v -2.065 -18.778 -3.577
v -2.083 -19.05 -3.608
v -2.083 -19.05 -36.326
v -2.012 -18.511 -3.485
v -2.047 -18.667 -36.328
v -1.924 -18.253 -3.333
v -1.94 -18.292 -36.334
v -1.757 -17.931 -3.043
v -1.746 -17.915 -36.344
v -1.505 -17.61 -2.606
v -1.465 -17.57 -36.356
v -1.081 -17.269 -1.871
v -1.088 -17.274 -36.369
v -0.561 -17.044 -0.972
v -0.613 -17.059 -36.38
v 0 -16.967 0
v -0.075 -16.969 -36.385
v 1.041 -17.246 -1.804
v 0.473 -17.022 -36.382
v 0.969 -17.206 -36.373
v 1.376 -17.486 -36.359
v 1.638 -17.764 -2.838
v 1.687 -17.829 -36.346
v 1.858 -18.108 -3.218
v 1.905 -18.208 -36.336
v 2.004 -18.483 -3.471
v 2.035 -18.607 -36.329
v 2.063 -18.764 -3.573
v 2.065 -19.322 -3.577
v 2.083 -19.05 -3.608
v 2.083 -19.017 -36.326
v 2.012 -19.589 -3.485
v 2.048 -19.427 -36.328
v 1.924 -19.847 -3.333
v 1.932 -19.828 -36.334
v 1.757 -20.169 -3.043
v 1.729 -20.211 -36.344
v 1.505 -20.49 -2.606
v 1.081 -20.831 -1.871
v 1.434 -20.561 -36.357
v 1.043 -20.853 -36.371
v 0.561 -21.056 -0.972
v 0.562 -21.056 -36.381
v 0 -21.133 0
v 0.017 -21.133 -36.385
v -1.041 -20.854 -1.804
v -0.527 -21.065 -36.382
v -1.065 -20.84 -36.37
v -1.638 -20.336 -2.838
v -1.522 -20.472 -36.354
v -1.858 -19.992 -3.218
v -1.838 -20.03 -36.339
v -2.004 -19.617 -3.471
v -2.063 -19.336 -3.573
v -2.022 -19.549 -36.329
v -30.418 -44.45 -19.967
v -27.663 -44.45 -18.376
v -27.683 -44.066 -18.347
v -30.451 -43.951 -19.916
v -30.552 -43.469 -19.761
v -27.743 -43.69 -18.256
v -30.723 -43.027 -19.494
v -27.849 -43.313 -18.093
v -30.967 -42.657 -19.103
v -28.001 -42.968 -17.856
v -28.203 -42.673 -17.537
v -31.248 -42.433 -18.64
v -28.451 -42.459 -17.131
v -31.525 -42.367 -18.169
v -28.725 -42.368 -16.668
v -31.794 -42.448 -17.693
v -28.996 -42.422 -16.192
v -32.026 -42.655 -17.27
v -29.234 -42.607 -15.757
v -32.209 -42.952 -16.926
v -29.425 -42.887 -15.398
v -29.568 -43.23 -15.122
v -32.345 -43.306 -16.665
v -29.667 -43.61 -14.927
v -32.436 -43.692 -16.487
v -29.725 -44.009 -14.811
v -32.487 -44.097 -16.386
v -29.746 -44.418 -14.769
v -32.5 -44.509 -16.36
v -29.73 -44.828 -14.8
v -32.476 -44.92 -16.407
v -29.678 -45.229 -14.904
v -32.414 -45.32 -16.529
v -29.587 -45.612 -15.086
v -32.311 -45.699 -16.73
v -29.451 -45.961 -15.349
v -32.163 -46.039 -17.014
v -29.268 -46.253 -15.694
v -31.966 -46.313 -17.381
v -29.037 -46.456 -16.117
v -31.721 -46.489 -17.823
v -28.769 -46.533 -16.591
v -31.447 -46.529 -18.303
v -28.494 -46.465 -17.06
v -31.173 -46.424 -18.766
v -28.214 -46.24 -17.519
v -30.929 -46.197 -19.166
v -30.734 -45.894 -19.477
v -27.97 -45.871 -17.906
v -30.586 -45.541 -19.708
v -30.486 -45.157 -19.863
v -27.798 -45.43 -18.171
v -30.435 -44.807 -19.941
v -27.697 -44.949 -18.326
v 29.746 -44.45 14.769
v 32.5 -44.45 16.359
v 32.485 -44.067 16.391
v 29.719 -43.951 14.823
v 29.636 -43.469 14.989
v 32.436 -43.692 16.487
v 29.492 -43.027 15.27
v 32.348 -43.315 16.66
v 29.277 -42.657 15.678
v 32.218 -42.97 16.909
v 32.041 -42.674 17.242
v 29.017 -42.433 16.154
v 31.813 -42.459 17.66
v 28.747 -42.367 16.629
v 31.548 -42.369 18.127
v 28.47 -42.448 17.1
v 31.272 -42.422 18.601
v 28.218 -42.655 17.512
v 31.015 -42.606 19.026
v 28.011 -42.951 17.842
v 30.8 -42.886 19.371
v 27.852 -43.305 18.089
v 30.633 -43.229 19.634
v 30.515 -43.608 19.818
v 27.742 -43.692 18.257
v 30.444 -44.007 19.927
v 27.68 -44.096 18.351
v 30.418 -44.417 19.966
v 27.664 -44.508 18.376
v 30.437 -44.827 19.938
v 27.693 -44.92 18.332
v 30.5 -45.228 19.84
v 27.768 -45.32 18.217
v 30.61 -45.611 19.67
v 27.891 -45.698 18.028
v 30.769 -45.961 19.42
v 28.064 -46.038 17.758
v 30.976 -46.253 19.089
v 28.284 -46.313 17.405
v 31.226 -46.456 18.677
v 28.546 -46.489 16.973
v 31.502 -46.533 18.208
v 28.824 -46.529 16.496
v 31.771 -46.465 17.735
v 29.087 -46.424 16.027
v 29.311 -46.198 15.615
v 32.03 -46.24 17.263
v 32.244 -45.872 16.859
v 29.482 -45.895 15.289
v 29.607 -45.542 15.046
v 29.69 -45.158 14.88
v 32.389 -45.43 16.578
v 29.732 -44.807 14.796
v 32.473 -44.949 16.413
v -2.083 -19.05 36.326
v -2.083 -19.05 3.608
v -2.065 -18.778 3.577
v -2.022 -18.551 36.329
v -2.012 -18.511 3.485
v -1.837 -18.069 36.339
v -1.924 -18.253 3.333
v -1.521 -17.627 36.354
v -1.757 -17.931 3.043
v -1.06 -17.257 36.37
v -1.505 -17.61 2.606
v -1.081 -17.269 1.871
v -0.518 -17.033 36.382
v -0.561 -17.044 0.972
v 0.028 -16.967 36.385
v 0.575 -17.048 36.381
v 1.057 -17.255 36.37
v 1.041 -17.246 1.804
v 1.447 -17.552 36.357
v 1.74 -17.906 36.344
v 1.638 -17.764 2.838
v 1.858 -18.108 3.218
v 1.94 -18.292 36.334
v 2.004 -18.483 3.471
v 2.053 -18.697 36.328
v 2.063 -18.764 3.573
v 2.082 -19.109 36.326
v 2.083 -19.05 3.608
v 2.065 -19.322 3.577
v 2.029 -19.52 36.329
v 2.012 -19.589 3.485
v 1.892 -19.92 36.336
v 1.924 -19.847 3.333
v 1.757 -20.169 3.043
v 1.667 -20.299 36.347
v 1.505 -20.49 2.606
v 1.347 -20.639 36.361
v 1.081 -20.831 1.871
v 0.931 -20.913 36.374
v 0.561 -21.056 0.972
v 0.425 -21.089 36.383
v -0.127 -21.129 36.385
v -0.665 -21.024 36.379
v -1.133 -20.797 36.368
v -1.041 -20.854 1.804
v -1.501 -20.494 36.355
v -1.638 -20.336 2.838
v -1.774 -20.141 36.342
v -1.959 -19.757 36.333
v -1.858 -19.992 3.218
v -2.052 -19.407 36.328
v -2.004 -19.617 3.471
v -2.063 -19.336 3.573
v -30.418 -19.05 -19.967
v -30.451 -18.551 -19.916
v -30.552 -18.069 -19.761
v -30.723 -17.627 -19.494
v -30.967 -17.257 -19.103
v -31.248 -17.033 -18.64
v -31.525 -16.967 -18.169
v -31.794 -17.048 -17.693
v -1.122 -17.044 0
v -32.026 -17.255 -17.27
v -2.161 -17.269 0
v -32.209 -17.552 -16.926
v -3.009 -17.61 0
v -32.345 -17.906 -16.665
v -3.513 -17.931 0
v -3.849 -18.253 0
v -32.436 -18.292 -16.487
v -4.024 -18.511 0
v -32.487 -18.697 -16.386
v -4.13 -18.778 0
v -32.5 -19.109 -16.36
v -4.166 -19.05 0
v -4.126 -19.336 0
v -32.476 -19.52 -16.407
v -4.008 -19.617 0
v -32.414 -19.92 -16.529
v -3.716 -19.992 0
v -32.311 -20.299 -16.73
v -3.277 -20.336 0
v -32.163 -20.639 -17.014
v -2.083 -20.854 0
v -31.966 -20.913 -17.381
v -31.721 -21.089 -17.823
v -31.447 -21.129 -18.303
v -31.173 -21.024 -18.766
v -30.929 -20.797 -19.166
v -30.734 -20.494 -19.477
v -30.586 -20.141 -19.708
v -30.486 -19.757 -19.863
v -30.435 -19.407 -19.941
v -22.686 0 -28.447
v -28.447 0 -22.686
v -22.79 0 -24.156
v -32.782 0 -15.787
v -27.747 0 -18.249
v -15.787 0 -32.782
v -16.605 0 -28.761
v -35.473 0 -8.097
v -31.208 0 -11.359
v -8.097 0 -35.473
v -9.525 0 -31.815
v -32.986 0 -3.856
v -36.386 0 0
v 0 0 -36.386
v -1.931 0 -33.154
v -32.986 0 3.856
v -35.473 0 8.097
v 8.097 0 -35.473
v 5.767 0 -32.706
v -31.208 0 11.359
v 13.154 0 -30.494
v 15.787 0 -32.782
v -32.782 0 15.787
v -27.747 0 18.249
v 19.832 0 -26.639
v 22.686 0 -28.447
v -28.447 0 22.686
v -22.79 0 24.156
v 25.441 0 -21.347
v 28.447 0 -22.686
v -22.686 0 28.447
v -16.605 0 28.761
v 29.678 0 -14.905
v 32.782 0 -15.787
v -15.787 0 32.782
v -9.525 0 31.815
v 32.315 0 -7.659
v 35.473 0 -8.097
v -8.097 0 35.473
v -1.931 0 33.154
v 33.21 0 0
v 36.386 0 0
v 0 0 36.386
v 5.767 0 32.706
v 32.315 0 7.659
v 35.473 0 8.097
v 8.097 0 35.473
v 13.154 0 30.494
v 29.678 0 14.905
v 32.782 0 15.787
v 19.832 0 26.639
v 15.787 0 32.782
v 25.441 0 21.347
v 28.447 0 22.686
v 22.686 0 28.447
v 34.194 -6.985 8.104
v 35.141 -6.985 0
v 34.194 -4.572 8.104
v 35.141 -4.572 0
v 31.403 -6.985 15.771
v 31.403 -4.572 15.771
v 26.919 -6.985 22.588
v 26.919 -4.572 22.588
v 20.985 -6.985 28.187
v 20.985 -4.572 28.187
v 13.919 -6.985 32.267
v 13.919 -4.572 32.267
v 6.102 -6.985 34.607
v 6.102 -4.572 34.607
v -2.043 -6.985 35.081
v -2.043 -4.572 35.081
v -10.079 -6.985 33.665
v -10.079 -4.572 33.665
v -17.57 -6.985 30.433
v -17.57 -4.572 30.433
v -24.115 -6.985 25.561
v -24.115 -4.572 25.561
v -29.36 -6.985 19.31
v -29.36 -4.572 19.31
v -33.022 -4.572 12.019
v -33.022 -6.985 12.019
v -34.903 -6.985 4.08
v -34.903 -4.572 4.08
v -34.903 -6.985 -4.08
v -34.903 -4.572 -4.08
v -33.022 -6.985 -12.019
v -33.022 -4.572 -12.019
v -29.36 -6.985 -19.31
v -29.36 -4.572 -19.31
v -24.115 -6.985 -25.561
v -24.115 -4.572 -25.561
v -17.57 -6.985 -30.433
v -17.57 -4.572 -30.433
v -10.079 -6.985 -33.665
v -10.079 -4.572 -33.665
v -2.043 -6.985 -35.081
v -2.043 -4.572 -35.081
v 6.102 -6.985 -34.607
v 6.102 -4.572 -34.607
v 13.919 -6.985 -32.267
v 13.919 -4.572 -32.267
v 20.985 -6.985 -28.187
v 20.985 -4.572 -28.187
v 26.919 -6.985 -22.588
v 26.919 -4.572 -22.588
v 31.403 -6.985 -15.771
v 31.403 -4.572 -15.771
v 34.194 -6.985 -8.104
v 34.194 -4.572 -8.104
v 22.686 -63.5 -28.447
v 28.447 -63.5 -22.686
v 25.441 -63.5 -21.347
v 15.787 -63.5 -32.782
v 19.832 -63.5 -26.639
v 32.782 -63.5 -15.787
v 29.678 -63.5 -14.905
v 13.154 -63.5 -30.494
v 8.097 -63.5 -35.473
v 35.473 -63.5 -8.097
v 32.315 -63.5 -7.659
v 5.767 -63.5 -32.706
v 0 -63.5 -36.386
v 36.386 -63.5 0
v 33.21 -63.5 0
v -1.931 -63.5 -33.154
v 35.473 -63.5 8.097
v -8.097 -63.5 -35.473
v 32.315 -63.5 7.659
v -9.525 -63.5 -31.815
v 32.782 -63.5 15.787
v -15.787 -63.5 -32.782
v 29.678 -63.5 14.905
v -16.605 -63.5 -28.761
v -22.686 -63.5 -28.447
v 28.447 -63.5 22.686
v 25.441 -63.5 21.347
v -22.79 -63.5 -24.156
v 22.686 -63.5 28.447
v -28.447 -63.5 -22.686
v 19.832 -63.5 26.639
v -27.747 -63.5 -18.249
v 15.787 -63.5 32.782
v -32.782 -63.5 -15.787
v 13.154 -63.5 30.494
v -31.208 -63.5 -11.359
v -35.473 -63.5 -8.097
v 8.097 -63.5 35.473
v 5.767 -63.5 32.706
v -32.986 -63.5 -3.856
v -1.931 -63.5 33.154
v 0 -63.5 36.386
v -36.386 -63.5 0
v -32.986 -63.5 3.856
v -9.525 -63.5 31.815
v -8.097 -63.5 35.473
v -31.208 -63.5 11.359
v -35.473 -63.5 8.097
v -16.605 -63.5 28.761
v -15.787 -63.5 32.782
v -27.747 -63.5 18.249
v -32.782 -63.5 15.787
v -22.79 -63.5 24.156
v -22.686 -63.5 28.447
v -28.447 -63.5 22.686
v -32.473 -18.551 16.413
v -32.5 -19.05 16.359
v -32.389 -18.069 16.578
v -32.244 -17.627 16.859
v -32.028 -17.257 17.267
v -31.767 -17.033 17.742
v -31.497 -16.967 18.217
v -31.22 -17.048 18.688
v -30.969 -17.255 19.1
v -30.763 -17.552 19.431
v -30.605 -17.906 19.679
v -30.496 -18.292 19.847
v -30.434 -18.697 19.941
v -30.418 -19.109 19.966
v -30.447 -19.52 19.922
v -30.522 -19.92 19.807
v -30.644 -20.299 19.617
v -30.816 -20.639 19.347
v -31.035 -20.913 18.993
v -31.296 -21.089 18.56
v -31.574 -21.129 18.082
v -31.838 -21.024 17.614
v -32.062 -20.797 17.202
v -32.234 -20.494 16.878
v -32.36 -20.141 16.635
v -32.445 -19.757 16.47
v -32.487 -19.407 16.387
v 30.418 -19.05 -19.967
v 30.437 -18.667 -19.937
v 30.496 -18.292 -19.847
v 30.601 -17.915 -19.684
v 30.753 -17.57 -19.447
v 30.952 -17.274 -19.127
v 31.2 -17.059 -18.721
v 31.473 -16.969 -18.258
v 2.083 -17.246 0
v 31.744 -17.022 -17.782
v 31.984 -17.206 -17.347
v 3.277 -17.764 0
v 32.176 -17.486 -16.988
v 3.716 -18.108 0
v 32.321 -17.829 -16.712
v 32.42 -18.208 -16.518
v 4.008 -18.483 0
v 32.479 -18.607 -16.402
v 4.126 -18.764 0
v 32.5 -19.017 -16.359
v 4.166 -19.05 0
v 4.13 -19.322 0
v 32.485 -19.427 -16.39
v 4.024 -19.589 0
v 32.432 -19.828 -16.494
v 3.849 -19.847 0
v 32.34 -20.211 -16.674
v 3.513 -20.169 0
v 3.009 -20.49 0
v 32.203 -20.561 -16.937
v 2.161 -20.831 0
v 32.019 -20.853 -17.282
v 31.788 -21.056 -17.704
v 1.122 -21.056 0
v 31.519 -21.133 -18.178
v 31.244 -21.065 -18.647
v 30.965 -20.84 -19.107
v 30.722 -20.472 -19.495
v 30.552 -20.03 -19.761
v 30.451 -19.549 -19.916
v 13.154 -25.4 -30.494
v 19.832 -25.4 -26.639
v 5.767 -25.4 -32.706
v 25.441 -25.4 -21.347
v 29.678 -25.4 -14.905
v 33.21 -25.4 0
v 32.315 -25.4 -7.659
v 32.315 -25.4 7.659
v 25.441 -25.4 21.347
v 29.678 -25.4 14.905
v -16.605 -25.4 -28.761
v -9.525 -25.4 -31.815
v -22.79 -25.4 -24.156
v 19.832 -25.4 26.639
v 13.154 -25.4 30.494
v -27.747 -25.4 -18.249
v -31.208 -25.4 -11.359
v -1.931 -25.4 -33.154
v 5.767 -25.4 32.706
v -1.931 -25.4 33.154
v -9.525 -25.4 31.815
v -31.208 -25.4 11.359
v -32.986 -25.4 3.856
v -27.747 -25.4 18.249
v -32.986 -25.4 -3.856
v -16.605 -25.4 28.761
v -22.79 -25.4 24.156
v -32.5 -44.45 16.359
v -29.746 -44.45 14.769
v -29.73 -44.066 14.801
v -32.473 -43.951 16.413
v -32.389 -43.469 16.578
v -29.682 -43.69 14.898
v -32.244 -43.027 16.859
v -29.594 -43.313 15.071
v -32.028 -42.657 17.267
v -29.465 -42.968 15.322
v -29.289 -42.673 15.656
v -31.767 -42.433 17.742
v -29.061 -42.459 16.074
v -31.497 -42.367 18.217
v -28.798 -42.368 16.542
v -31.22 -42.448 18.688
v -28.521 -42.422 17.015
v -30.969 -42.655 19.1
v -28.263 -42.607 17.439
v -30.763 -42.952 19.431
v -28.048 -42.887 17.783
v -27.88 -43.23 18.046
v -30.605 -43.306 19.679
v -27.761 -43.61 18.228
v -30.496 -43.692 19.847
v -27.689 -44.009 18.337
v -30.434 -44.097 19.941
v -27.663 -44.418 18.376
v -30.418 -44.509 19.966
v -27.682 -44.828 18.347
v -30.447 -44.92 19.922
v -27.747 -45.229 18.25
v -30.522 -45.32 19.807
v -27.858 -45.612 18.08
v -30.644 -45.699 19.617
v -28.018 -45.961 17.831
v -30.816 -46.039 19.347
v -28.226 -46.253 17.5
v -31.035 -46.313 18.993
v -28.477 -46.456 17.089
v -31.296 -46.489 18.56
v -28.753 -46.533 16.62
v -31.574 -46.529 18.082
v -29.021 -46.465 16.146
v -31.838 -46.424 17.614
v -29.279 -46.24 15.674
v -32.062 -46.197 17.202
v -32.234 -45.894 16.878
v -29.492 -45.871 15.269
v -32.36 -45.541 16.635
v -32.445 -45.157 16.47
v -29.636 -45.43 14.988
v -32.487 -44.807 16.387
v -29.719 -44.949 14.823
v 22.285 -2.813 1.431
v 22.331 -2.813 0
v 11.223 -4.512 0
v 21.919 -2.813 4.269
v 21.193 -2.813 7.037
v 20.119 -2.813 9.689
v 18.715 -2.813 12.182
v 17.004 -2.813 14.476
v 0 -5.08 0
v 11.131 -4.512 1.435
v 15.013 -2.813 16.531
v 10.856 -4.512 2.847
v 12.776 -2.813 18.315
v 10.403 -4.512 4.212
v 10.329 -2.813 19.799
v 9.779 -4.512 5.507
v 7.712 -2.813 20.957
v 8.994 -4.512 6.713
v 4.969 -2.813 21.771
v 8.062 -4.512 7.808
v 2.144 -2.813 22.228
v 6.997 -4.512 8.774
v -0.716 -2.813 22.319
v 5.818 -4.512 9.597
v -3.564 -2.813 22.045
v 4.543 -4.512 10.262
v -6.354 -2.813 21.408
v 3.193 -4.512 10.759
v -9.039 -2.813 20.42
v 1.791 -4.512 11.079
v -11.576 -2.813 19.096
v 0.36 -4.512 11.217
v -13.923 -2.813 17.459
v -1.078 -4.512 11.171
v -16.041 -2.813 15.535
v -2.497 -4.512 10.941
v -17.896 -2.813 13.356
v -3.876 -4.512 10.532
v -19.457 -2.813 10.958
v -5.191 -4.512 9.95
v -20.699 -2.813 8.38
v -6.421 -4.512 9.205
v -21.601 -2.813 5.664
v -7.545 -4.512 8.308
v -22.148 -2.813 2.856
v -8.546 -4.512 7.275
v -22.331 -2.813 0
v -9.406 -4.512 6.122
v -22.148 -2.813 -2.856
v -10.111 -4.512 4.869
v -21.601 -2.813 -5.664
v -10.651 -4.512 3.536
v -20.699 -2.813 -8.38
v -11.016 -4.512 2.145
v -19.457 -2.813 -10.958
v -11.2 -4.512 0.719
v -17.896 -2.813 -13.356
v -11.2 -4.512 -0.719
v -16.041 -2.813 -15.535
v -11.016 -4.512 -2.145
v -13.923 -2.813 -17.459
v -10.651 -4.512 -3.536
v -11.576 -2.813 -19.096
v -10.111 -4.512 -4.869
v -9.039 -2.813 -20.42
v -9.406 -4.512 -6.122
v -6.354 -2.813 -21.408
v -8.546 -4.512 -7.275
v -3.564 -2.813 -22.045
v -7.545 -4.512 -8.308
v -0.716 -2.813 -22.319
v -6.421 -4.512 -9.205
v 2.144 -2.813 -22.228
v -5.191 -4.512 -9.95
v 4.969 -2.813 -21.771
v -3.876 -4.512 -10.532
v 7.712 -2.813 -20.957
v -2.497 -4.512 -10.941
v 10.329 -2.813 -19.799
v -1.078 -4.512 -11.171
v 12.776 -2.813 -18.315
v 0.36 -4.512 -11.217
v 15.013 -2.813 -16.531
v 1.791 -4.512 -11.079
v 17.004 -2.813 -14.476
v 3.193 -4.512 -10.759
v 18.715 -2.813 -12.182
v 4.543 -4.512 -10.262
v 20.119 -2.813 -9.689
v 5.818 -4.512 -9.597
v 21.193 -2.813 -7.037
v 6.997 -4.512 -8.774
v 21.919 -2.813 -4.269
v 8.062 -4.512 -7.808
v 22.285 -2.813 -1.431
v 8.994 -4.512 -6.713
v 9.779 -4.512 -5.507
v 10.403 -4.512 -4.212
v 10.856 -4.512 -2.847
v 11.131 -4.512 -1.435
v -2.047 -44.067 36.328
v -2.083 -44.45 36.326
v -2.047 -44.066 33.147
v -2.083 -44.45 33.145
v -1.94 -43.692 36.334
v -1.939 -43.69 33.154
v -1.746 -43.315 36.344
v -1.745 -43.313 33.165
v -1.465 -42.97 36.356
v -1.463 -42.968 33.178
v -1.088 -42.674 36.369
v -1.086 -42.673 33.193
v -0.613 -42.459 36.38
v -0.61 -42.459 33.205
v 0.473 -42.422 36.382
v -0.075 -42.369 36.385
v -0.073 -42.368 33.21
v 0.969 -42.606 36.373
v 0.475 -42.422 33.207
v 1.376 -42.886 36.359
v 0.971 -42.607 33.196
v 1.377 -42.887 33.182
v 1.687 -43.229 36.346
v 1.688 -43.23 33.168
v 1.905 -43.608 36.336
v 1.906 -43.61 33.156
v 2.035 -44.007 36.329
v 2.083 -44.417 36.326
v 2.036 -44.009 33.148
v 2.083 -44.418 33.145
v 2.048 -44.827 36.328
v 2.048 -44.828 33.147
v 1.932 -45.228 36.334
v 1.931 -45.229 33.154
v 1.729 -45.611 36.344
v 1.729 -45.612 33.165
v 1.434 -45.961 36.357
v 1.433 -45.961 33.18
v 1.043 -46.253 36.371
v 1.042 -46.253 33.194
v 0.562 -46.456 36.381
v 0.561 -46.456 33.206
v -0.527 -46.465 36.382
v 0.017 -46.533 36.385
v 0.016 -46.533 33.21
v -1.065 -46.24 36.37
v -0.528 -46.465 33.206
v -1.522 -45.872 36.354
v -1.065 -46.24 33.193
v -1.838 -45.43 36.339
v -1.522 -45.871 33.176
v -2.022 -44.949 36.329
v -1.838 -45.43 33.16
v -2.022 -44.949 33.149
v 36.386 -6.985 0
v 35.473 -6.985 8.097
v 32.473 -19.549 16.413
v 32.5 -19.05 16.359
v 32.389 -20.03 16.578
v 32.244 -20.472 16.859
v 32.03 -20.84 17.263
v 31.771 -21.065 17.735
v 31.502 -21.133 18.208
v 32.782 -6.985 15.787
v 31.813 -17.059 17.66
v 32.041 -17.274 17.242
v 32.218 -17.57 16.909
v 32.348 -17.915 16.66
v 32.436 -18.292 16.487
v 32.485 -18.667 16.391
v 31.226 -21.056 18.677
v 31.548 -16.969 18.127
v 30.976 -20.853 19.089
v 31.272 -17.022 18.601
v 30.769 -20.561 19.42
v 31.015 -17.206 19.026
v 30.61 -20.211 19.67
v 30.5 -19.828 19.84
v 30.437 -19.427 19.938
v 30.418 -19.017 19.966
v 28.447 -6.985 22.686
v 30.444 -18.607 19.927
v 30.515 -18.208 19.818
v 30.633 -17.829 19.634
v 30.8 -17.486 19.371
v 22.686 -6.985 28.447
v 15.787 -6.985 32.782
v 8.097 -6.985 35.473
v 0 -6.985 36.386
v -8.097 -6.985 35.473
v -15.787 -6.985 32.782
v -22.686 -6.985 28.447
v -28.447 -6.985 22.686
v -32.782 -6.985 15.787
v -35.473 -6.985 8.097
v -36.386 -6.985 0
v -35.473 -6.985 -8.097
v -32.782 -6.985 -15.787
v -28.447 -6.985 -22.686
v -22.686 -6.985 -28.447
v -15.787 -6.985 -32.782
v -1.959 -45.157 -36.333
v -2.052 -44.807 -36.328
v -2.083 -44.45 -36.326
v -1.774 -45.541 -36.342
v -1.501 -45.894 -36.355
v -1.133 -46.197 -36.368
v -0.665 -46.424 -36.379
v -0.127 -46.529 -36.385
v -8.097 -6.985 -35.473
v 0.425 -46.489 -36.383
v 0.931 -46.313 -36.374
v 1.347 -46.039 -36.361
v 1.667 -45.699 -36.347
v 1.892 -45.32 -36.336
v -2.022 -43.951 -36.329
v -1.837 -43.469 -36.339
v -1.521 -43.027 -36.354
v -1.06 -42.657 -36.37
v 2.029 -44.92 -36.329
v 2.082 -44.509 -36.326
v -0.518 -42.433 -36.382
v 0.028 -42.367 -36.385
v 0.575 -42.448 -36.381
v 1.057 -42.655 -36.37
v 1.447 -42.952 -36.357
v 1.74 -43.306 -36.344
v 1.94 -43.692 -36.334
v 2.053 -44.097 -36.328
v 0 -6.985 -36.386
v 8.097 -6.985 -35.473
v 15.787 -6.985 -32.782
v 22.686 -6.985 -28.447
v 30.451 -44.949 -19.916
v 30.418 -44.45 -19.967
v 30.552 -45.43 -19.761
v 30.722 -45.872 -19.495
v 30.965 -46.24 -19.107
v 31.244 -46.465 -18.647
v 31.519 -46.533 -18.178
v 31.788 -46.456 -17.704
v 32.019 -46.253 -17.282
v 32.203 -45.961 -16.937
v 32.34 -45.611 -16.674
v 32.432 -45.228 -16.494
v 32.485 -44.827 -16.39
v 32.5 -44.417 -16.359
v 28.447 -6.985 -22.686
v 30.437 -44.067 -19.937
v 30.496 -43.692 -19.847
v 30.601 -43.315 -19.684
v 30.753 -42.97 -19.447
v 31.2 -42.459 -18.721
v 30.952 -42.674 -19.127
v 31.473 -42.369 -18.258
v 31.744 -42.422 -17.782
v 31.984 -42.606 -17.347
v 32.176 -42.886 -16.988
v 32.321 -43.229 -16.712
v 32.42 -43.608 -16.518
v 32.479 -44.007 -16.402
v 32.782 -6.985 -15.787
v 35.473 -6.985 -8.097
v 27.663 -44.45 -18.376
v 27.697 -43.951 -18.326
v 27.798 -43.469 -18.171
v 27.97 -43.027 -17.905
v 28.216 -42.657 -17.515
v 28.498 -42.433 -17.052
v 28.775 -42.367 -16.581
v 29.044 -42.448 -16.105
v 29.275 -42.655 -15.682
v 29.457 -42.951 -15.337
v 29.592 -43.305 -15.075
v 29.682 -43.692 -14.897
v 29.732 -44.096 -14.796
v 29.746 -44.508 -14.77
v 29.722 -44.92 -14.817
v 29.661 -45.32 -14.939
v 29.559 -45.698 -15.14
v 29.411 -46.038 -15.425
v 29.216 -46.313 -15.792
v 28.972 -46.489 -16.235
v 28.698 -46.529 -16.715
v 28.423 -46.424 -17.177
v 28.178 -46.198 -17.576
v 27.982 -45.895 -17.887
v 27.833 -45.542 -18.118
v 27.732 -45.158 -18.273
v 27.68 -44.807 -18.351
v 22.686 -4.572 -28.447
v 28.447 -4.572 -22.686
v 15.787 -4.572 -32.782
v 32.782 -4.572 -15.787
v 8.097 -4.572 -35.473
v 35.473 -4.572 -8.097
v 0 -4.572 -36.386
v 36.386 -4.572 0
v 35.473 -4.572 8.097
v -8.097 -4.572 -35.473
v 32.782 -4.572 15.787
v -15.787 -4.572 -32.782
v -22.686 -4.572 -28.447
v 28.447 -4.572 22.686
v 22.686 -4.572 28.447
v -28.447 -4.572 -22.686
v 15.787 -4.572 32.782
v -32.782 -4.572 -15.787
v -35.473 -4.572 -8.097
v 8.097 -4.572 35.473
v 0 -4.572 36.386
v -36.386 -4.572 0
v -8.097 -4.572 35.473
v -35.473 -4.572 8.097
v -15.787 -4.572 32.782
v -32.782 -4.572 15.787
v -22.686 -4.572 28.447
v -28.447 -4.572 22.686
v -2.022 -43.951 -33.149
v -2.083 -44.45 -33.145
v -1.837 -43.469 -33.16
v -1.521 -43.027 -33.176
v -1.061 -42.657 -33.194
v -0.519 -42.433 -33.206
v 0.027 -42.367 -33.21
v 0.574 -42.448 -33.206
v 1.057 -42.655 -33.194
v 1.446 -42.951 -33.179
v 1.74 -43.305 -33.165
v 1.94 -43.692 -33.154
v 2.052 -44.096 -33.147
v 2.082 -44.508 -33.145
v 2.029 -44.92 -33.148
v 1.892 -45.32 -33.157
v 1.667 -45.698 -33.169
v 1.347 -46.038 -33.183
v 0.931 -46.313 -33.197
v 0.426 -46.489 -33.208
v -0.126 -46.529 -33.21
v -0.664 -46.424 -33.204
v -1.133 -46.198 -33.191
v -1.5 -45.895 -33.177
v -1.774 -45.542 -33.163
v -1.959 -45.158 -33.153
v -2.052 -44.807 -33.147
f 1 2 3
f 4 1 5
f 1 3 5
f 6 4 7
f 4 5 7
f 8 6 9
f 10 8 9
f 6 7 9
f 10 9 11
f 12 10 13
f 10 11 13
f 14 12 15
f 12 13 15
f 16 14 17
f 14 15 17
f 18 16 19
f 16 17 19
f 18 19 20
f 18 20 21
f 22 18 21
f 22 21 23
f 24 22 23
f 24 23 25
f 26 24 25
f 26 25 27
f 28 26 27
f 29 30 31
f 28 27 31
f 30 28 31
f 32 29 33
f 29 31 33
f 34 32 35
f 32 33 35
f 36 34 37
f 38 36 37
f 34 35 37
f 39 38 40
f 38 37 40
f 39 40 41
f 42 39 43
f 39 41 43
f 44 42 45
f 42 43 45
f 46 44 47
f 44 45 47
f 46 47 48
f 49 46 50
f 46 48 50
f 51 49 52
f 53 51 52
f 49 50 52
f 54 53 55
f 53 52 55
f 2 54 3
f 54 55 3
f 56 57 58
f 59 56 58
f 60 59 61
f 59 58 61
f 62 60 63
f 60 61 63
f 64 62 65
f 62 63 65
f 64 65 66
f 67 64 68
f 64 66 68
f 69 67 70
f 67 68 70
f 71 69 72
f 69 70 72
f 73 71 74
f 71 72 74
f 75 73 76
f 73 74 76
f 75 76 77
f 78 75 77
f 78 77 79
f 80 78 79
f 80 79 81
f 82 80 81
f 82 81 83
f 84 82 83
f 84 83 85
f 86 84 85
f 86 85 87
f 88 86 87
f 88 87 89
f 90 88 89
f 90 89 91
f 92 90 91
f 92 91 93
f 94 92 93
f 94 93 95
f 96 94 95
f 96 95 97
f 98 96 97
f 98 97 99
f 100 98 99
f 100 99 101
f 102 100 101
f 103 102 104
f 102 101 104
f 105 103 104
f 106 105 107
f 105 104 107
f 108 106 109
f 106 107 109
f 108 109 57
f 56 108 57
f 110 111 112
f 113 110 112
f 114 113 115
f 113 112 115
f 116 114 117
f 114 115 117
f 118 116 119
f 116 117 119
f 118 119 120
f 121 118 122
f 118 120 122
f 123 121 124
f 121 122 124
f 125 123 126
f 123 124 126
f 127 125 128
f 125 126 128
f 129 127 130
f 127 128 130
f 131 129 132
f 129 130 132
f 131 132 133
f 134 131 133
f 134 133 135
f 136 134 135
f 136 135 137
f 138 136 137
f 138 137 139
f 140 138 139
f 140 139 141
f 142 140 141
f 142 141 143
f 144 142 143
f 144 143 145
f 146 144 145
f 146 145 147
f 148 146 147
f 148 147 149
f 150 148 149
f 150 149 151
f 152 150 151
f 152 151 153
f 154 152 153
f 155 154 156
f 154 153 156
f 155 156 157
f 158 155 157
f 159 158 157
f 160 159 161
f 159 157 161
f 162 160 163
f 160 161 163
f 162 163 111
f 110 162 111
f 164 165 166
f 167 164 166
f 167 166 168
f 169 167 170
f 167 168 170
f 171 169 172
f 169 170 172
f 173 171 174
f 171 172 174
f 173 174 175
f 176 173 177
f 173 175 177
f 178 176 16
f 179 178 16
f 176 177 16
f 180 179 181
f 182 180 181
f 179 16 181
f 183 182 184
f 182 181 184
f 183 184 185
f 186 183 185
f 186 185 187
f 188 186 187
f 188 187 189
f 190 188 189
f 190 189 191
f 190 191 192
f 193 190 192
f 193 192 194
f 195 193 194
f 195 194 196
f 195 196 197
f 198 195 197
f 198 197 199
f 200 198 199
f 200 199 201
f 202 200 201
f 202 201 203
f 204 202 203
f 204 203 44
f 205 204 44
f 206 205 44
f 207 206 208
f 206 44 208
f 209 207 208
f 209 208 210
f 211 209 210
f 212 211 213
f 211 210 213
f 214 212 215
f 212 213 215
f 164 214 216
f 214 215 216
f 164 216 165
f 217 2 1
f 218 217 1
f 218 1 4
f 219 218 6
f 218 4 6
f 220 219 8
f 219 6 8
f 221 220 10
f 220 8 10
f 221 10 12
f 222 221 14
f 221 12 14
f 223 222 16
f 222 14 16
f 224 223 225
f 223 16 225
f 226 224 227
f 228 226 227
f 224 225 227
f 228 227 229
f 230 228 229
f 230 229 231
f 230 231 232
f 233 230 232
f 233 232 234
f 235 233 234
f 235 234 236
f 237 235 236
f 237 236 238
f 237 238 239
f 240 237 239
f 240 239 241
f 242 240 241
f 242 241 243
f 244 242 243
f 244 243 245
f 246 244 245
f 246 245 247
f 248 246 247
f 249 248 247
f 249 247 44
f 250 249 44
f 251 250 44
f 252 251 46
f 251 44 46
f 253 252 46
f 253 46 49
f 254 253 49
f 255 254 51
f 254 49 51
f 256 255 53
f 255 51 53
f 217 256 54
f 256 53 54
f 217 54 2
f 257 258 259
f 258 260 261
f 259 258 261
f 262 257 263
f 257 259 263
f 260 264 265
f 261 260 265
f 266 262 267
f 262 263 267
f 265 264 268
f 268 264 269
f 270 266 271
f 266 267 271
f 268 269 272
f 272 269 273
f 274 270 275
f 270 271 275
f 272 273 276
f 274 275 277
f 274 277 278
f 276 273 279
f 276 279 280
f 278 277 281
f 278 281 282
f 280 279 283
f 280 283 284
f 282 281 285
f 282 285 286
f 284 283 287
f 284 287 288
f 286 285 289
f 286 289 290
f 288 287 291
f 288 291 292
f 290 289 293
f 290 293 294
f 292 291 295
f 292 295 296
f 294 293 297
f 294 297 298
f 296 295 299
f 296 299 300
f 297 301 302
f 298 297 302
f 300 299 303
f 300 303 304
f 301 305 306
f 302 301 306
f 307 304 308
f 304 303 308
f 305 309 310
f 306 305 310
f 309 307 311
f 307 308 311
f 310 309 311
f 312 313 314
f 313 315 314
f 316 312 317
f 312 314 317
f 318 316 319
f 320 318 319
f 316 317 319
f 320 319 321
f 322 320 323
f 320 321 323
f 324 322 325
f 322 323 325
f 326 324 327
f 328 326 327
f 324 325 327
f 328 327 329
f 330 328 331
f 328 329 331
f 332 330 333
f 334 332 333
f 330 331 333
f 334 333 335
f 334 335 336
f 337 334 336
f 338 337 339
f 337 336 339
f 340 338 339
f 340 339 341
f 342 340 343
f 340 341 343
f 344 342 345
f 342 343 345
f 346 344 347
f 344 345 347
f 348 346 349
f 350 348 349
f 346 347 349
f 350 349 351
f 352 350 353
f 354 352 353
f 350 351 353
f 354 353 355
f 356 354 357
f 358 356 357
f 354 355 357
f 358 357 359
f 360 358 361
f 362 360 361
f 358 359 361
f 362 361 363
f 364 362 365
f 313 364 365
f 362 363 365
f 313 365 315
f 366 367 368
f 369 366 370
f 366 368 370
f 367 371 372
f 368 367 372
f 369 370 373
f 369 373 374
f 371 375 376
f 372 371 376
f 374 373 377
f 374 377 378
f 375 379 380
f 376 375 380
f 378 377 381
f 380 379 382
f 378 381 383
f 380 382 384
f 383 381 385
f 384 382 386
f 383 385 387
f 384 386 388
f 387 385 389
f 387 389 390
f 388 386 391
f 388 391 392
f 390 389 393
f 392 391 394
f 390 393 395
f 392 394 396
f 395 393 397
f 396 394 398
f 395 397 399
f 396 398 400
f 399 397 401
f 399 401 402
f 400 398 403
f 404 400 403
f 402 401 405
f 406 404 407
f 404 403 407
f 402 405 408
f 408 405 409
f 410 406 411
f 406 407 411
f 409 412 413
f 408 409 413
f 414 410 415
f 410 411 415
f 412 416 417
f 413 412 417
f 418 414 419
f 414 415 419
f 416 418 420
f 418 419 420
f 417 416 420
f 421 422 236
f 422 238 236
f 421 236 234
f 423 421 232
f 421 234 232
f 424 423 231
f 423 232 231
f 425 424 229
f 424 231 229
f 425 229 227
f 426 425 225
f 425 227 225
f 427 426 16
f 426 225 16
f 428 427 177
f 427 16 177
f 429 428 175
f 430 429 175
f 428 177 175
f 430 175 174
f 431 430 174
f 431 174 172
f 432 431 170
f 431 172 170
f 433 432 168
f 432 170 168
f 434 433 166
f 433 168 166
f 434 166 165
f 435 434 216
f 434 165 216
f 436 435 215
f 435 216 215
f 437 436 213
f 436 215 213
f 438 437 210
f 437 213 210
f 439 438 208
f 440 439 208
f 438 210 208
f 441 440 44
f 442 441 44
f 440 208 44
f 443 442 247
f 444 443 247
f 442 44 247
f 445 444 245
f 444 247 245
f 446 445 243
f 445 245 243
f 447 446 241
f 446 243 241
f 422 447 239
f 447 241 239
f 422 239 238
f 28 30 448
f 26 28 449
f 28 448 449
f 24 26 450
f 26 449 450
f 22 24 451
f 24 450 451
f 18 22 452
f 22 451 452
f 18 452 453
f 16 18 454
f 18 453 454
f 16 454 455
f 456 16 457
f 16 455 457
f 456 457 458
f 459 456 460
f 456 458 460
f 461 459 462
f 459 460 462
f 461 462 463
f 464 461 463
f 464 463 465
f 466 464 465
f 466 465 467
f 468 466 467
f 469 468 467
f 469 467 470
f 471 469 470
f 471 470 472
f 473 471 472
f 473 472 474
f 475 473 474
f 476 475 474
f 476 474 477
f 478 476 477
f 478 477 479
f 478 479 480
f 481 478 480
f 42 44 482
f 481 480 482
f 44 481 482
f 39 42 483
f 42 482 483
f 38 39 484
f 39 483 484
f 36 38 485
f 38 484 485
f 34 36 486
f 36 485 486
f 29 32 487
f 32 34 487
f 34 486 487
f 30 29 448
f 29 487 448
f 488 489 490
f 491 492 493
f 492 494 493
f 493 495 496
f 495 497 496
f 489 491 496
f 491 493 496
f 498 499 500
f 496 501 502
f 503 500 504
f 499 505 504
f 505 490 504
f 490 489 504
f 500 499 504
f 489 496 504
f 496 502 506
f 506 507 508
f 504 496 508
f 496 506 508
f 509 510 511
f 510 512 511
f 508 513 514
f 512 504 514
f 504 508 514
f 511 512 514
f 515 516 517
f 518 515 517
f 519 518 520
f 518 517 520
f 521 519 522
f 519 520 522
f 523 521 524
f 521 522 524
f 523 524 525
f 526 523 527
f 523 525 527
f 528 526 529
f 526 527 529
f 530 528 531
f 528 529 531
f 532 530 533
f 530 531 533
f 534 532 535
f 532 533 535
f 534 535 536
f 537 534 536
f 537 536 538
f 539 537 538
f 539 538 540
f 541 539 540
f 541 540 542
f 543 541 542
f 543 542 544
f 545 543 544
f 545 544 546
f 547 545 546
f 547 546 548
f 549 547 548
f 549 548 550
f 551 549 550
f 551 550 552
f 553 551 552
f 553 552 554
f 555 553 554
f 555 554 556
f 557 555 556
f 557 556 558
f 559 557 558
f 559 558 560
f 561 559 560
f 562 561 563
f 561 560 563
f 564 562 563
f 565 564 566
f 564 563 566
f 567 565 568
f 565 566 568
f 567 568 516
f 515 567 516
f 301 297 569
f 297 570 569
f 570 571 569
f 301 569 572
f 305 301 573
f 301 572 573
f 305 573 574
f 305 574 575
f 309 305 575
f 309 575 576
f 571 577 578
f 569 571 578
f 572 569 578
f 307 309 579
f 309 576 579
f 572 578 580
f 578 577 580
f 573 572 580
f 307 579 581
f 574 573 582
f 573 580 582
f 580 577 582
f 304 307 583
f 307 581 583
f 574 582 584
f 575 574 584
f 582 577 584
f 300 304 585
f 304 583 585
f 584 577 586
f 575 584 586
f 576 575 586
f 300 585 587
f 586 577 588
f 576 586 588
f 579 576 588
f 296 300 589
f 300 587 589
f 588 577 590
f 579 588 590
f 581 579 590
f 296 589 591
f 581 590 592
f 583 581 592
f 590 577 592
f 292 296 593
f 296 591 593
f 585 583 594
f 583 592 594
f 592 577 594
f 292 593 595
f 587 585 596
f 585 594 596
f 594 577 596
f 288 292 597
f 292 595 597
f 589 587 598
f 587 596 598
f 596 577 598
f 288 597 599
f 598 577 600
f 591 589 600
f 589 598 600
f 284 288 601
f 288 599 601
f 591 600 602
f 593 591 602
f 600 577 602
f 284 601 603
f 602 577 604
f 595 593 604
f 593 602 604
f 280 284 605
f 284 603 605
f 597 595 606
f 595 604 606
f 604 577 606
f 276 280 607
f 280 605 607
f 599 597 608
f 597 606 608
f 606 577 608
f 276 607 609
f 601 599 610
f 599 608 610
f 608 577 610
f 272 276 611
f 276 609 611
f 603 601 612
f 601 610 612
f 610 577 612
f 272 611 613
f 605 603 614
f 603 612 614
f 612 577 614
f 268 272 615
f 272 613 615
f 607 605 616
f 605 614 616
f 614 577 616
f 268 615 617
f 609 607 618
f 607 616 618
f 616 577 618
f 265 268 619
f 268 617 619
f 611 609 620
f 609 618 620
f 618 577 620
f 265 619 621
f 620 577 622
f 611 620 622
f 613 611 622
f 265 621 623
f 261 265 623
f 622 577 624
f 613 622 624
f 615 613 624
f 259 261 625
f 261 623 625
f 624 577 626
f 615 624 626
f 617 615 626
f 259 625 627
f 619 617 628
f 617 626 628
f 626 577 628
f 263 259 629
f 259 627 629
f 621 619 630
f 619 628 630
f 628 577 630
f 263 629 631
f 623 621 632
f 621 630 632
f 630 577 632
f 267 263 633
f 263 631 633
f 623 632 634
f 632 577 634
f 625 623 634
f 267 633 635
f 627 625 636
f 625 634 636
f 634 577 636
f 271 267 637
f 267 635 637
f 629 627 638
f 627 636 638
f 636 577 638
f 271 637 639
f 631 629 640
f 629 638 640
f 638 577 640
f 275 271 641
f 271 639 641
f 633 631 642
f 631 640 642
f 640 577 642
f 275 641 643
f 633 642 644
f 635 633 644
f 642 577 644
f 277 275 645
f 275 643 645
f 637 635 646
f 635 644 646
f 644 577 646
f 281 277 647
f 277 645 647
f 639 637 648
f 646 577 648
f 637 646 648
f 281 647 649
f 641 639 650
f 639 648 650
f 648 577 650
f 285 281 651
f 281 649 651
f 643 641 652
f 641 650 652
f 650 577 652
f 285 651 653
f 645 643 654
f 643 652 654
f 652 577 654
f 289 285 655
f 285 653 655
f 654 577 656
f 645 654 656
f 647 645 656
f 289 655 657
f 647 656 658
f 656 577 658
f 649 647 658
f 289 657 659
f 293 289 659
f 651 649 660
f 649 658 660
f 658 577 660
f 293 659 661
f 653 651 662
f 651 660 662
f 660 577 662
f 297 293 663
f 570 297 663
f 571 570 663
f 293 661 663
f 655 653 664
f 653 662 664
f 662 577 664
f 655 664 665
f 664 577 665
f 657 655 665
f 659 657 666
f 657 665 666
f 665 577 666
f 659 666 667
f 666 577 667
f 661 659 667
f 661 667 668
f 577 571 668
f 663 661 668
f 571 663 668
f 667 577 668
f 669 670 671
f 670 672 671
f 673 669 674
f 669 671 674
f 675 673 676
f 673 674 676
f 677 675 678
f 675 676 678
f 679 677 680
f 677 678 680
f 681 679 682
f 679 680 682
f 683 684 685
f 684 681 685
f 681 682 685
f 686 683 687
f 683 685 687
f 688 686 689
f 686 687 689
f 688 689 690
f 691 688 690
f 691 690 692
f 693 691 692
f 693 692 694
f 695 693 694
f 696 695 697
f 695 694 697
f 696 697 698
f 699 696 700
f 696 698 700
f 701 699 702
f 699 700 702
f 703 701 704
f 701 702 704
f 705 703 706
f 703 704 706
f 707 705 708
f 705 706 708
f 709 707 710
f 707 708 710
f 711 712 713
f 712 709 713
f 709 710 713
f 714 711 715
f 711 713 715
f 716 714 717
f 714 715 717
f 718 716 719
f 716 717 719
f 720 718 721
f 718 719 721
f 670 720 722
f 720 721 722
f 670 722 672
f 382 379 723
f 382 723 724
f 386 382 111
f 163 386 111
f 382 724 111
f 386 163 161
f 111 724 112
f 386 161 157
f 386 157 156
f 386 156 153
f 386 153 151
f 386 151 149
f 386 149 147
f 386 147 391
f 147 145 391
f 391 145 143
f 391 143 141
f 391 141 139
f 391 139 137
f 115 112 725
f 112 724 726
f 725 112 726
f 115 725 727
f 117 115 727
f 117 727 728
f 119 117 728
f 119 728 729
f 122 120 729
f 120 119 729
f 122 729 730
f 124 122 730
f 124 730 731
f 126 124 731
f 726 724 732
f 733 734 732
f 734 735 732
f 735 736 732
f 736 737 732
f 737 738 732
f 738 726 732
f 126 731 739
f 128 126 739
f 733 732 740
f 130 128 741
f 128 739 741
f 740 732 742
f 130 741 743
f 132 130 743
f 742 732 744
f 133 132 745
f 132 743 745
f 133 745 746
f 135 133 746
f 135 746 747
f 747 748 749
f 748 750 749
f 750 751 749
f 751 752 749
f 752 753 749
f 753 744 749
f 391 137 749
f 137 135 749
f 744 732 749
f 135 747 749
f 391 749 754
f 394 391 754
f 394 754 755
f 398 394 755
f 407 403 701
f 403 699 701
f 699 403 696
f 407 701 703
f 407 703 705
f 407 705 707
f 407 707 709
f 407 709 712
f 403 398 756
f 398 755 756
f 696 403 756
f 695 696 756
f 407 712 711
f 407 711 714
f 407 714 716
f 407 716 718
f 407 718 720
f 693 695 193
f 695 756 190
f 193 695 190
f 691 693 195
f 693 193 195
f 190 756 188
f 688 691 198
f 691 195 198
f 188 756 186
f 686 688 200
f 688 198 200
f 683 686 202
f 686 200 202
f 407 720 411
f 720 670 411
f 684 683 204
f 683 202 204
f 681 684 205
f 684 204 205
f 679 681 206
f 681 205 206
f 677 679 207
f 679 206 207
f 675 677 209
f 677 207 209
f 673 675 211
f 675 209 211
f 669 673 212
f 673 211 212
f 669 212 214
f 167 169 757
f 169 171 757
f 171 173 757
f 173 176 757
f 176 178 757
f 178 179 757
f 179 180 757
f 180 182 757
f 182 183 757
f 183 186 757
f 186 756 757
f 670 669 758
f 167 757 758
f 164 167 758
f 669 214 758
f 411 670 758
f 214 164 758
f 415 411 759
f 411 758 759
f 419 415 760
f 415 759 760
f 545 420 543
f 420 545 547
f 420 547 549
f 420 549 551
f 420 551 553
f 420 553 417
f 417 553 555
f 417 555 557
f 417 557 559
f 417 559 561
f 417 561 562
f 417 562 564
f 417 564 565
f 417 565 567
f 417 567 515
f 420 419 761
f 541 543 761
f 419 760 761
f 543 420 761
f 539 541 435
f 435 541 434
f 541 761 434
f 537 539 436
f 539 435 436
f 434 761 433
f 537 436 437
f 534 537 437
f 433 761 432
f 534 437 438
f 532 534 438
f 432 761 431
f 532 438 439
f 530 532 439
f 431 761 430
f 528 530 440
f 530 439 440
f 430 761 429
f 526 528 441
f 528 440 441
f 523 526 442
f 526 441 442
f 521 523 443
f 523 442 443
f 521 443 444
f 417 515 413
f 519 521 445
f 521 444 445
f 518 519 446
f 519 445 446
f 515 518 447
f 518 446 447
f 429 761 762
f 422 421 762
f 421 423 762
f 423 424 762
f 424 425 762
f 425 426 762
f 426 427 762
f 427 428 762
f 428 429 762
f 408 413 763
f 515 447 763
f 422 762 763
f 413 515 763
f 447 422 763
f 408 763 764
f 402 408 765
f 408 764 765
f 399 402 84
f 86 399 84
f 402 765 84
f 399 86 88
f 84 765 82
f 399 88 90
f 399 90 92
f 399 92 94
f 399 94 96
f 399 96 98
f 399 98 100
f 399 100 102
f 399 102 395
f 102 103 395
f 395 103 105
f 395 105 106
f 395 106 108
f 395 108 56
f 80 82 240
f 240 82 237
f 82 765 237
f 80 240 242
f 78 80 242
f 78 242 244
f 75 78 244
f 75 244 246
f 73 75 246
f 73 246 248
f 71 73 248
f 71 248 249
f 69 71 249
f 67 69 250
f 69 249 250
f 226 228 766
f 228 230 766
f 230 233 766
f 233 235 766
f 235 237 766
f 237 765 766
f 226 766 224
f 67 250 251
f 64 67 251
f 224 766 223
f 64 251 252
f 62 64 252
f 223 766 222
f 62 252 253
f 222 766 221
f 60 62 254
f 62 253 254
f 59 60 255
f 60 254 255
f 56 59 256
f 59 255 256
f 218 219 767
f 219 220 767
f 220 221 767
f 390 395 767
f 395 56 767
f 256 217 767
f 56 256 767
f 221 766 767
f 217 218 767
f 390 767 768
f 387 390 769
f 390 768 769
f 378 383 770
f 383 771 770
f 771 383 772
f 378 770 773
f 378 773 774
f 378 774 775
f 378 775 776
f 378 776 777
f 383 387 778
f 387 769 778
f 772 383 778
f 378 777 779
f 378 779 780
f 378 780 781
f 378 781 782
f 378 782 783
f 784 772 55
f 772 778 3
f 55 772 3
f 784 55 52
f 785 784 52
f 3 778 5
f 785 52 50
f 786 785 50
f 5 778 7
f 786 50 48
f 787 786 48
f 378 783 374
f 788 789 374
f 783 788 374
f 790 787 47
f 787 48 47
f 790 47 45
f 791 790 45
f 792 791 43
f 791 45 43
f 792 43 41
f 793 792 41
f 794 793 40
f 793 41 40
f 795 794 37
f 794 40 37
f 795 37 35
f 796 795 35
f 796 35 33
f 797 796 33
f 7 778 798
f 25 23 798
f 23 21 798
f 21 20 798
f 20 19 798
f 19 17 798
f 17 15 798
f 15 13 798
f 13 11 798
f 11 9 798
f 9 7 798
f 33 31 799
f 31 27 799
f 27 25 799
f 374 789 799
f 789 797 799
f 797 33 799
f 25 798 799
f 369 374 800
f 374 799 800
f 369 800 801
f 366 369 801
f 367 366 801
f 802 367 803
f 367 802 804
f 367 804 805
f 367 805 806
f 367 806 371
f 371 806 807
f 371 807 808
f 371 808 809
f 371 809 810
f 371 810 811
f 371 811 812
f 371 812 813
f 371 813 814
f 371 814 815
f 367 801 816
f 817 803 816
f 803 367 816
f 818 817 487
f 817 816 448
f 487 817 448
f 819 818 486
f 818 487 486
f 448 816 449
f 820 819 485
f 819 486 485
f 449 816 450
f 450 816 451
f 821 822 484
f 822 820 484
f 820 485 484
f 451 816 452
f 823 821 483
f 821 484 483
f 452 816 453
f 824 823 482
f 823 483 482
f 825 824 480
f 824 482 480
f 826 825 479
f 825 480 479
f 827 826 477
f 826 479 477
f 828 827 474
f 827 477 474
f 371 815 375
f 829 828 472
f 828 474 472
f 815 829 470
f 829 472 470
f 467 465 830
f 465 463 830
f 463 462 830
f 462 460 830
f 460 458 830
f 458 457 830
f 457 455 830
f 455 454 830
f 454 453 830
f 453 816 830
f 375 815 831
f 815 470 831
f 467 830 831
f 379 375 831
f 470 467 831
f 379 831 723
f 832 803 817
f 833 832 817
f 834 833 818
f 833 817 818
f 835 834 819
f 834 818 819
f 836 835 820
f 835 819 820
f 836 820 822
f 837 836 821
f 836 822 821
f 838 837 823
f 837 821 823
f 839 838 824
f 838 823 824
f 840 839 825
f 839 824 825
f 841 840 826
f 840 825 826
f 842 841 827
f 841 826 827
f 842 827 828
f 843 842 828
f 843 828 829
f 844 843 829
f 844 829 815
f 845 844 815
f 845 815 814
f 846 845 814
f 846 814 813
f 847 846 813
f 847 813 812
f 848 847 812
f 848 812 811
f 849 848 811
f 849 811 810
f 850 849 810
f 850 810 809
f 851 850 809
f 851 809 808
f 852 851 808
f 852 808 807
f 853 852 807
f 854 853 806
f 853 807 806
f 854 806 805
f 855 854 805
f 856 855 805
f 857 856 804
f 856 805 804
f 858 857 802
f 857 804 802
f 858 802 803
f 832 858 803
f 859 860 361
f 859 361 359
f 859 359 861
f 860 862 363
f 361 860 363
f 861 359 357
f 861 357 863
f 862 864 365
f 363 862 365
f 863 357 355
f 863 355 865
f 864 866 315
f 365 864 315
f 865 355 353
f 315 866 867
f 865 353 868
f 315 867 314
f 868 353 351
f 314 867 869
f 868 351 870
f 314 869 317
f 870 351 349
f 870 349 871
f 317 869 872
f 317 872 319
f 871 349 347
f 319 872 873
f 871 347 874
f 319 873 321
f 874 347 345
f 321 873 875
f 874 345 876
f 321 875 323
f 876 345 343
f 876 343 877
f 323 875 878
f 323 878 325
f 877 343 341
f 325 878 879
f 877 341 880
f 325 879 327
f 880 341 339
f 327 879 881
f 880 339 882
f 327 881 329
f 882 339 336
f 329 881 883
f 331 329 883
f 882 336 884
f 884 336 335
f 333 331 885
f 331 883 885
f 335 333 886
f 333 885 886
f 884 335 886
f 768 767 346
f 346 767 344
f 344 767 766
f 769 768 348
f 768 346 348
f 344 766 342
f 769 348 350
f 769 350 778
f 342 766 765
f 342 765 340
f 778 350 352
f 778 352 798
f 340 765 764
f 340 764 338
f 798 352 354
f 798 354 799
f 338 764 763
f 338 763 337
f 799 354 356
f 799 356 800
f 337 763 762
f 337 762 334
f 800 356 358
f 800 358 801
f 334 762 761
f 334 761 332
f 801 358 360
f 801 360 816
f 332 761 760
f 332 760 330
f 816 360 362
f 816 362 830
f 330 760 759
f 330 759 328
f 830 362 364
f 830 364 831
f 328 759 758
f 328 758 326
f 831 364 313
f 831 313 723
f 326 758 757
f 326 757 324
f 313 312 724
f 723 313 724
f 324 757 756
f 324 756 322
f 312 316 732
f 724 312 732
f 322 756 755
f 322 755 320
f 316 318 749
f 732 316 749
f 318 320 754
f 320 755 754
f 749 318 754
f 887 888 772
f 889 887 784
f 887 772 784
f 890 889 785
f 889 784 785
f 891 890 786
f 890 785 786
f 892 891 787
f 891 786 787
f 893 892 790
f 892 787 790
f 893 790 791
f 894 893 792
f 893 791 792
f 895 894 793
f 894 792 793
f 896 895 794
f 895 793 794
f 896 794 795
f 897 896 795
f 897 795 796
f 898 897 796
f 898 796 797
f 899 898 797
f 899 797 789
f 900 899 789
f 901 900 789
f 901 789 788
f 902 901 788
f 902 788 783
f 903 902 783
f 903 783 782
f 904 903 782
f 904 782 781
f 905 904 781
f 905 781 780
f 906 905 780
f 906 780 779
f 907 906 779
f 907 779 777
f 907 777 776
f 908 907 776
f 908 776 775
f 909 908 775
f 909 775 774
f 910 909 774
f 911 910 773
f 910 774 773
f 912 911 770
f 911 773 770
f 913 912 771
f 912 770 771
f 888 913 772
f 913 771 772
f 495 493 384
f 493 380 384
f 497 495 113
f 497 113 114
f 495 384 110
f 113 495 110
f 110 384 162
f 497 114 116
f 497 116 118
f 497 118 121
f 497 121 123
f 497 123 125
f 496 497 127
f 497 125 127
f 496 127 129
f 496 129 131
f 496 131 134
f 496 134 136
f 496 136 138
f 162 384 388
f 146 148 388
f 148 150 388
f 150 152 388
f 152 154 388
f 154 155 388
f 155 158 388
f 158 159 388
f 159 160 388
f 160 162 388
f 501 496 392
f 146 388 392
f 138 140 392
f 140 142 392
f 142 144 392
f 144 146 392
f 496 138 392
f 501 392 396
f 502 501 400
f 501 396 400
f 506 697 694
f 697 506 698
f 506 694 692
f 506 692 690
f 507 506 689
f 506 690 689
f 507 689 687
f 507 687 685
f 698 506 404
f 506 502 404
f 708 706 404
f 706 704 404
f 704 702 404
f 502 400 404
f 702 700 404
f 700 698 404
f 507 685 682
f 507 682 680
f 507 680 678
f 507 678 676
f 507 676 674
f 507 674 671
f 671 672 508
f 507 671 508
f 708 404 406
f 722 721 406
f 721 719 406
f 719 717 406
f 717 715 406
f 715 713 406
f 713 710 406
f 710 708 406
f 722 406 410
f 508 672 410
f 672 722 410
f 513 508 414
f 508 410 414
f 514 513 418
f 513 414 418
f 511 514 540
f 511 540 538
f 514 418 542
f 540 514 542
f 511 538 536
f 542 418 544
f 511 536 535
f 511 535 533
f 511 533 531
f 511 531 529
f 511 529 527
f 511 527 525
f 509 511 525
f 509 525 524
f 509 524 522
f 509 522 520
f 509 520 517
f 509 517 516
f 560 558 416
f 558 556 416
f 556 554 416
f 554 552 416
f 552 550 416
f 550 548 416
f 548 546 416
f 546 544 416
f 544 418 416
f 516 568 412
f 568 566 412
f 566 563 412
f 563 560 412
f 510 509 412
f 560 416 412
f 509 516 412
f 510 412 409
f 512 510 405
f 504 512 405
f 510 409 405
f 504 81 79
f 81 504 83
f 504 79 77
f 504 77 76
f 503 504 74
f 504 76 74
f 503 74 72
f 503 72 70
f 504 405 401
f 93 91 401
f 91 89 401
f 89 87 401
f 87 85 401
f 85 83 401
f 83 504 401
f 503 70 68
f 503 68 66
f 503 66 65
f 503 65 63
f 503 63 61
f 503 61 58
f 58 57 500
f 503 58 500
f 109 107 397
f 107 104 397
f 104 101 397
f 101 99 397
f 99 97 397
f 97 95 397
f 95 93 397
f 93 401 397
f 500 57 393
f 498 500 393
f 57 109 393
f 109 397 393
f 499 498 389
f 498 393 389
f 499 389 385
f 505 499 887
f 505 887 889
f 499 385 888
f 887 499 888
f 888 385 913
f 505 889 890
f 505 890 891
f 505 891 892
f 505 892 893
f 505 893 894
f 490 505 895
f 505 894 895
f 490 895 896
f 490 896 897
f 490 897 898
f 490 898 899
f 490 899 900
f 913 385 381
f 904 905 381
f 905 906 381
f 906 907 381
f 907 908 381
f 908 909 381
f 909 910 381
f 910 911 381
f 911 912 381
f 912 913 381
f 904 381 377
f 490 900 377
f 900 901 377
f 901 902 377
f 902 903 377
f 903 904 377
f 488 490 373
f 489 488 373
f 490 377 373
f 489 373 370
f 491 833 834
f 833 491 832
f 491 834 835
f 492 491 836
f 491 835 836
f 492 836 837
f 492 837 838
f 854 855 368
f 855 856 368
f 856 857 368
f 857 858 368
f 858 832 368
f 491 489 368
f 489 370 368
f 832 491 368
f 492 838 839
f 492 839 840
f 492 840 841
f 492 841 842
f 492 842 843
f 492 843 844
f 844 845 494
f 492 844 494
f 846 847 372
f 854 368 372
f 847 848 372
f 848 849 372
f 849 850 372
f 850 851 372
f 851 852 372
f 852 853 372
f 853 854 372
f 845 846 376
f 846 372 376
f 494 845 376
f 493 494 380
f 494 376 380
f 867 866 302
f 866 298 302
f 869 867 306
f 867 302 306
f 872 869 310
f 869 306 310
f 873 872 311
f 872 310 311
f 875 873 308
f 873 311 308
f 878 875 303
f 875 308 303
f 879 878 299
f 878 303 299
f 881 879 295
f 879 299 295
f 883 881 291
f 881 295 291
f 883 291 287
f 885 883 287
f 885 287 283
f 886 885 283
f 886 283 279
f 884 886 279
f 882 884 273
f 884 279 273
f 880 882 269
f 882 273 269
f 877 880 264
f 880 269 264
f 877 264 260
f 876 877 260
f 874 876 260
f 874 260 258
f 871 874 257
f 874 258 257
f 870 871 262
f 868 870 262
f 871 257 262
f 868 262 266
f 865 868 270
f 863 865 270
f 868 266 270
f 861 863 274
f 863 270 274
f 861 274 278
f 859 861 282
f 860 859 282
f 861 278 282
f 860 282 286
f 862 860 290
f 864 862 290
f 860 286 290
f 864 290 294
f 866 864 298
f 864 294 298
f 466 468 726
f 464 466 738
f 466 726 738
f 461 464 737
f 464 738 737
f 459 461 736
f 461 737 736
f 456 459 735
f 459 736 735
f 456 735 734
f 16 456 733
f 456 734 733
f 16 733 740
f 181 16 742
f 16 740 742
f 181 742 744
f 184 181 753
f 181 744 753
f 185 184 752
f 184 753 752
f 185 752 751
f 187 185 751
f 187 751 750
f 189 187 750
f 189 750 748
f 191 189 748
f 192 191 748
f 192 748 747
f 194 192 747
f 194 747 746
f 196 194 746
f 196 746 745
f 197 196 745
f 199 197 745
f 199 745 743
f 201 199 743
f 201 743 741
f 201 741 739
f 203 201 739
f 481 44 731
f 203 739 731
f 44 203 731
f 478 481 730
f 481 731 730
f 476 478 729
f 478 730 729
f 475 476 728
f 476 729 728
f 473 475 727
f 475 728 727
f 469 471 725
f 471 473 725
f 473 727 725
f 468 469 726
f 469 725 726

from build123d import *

# Parameters (mm, degrees)
F_19_0_164_DIAMETER_HOLE1_D = 4.1656
CIRPATTERN2_COUNT           = 6


with BuildPart() as part:
    # Sketch1 → Revolve2 (revolve)
    with BuildSketch(Plane.XY):
        with BuildLine():
            Line((0, -25.4), (33.2105, -25.4))
            Line((33.2105, -25.4), (33.2105, -63.5))
            Line((33.2105, -63.5), (36.3855, -63.5))
            Line((36.3855, -63.5), (36.3855, -6.985))
            Line((36.3855, -6.985), (35.1409, -6.985))
            Line((35.1409, -6.985), (35.1409, -4.572))
            Line((35.1409, -4.572), (36.3855, -4.572))
            Line((36.3855, -4.572), (36.3855, 0))
            Line((36.3855, 0), (33.2105, 0))
            ThreePointArc((33.2105, 0), (16.798390624, -3.802656831), (0, -5.08))
            Line((0, -5.08), (0, -25.4))
        make_face()
    revolve(axis=Axis((0, 0, 0), (0, -1, 0)))

    # #19 (0.164) Diameter Hole1 (through all)
    with Locations(Plane(origin=(0, -19.049997805, 36.3855), x_dir=(1, 0, 0), z_dir=(0, 0, 1))):
        with Locations((0, 0), (0, -25.400002195)):
            f_19_0_164_diameter_hole1 = Hole(F_19_0_164_DIAMETER_HOLE1_D / 2)

    # CirPattern2: #19 (0.164) Diameter Hole1 ×6 about axis
    cirpattern2_axis = Axis((0, 0, 0), (0, -1, 0))
    for i in range(1, CIRPATTERN2_COUNT):
        add(f_19_0_164_diameter_hole1.rotate(cirpattern2_axis, i * 360 / CIRPATTERN2_COUNT), mode=Mode.SUBTRACT)


solid = part.part
